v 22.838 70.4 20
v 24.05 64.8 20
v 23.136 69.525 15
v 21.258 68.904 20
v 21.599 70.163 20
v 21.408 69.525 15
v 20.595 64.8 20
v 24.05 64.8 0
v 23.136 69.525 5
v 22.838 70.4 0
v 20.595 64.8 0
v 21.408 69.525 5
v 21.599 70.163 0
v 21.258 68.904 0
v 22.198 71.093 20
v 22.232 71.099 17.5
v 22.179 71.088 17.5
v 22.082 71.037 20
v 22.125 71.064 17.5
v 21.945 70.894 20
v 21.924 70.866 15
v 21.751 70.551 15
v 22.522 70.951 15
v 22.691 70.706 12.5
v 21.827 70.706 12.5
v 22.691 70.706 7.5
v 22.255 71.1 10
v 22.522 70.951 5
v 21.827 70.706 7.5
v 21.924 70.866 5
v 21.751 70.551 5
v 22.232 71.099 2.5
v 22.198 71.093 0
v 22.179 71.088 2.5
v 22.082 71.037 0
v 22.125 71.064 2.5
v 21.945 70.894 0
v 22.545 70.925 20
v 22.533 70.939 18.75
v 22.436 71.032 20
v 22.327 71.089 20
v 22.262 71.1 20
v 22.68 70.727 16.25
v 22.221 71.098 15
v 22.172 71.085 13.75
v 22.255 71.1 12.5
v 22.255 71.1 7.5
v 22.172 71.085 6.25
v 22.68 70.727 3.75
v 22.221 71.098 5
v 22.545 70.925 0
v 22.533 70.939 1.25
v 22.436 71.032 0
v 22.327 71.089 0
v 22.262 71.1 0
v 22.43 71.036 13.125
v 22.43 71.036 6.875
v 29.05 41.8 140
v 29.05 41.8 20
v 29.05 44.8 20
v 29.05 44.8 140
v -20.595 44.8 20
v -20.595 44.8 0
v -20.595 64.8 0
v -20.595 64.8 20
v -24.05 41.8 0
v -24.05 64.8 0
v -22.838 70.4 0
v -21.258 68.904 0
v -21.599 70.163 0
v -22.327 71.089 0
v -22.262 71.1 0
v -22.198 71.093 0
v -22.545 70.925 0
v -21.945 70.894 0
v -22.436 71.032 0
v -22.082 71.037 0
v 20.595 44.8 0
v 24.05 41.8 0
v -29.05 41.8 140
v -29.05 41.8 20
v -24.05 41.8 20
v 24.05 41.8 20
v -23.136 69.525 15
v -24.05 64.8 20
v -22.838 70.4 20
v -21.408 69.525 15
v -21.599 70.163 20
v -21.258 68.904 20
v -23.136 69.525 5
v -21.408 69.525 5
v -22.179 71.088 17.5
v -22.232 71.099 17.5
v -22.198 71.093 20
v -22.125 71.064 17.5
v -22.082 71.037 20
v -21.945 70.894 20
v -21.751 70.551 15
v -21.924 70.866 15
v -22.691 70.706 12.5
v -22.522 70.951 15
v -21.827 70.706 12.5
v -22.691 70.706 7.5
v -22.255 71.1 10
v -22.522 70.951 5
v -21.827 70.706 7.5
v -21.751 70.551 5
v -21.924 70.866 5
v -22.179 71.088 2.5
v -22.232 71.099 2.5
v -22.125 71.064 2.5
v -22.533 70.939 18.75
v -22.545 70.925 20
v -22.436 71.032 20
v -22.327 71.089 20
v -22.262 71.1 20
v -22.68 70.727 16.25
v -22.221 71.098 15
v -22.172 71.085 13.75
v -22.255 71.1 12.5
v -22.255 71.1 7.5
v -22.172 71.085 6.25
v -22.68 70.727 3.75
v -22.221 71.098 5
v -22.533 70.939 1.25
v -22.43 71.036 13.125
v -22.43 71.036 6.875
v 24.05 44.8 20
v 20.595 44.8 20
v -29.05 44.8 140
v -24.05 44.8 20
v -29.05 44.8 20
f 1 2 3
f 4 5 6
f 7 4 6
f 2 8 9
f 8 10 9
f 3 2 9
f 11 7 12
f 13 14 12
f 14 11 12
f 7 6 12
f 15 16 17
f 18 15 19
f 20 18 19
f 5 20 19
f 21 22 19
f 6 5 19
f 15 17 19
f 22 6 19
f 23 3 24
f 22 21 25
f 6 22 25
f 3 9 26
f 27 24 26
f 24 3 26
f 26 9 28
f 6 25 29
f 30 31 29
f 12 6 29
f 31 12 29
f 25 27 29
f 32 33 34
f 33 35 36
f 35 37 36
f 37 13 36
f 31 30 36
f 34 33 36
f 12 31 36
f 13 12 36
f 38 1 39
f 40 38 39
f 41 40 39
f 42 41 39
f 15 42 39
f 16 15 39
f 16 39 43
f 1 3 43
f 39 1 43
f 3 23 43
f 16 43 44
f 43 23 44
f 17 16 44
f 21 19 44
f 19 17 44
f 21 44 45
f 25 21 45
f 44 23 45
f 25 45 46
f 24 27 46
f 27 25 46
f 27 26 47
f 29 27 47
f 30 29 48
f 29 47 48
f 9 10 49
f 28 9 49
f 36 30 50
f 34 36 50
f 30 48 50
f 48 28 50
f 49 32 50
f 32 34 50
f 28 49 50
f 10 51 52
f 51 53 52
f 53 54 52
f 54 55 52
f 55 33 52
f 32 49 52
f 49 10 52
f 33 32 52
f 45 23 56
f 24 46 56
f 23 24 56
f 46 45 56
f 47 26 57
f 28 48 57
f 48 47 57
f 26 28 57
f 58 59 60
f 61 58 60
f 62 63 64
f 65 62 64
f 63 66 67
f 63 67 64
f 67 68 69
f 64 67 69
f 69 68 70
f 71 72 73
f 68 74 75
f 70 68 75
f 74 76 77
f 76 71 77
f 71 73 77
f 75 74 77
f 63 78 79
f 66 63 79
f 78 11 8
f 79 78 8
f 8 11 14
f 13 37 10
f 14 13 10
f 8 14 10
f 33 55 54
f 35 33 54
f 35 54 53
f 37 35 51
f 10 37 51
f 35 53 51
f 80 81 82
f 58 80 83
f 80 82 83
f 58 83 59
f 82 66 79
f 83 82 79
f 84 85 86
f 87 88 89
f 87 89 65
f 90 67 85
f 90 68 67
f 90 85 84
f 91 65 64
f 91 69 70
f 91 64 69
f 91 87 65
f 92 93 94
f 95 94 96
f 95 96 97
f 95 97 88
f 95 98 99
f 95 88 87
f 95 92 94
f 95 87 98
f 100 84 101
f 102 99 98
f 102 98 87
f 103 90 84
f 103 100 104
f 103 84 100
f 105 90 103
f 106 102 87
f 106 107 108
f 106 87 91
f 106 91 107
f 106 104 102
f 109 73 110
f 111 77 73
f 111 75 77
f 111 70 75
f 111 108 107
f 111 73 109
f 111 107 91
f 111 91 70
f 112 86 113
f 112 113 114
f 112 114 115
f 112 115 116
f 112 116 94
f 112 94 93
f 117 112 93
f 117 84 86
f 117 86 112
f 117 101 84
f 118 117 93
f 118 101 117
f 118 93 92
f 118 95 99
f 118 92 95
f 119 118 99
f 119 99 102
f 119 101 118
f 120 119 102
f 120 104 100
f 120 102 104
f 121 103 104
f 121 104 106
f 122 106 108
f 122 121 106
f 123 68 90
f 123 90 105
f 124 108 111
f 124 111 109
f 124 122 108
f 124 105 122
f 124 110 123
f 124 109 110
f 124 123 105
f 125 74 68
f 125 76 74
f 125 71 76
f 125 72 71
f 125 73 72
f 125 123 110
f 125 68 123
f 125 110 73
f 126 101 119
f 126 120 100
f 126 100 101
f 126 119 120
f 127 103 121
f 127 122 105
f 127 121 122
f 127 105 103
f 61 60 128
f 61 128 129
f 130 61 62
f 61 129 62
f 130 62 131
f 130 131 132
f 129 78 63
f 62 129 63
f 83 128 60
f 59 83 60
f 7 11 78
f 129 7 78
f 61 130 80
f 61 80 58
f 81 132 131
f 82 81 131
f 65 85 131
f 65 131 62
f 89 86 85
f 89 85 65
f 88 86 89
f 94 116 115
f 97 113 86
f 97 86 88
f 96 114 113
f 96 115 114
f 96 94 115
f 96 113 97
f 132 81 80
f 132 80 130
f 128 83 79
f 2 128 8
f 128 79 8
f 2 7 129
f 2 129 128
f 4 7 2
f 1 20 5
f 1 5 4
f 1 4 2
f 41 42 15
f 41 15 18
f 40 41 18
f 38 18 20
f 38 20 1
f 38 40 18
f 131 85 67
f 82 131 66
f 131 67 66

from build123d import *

# Parameters (mm, degrees)
BOSS_EXTRUDE1_DEPTH = 20
SKETCH2_W           = 5
SKETCH2_H           = 3
BOSS_EXTRUDE2_DEPTH = 120


with BuildPart() as part:
    # Sketch1 → Boss-Extrude1 (new body)
    with BuildSketch(Plane.XY):
        with BuildLine():
            Line((-24.05, 64.8), (-24.05, 41.8))
            Line((-24.05, 41.8), (24.05, 41.8))
            Line((24.05, 41.8), (24.05, 64.8))
            add(Edge.make_bspline(
                [(24.05, 64.8), (22.187774265, 77.400108054), (20.594686421, 64.8)],
                knots=[0, 0, 0, 1, 1, 1], degree=2))
            Line((20.594686421, 64.8), (20.594686421, 44.8))
            Line((20.594686421, 44.8), (-20.594686421, 44.8))
            Line((-20.594686421, 44.8), (-20.594686421, 64.8))
            add(Edge.make_bspline(
                [(-24.05, 64.8), (-22.187774265, 77.400108054), (-20.594686421, 64.8)],
                knots=[0, 0, 0, 1, 1, 1], degree=2))
        make_face()
    extrude(amount=BOSS_EXTRUDE1_DEPTH)

    # Sketch2 → Boss-Extrude2 (add)
    with BuildSketch(Plane.XY.offset(20)):
        with Locations((-26.55, 43.3)):
            Rectangle(SKETCH2_W, SKETCH2_H)
        Polygon((-24.05, 44.8), (-24.05, 41.8), (24.05, 41.8), (24.05, 44.8), (20.594686421, 44.8), (-20.594686421, 44.8), align=None)
        with Locations((26.55, 43.3)):
            Rectangle(SKETCH2_W, SKETCH2_H)
    extrude(amount=BOSS_EXTRUDE2_DEPTH)


solid = part.part
